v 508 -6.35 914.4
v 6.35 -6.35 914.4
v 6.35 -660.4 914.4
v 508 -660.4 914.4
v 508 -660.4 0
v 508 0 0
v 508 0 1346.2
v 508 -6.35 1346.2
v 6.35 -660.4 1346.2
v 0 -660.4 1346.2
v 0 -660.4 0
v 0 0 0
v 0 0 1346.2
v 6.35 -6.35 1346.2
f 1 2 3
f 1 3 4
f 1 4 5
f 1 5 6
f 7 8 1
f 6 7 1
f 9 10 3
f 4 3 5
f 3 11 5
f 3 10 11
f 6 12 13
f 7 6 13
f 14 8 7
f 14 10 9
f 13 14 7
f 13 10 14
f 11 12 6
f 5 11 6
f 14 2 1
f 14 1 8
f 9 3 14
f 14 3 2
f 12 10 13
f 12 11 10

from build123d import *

# Parameters (mm, degrees)
F0_W     = 508
F0_H     = 660.4
F1_DEPTH = 914.4
F2_W     = 6.35
F2_H     = 660.4
F3_DEPTH = 431.8
F4_W     = 6.35
F4_H     = 431.8
F5_DEPTH = 501.65


with BuildPart() as f1:
    # F0 (on Top) → F1 (new body)
    with BuildSketch(Plane.XY):
        with Locations((254, -330.2)):
            Rectangle(F0_W, F0_H)
    extrude(amount=F1_DEPTH)

    # F2 (on face) → F3 (join)
    with BuildSketch(Plane.XY.offset(914.4)):
        with Locations((3.175, -330.2)):
            Rectangle(F2_W, F2_H)
    extrude(amount=F3_DEPTH)

    # F4 (on face) → F5 (join)
    with BuildSketch(Plane.YZ.offset(6.35)):
        with Locations((-3.175, 1130.3)):
            Rectangle(F4_W, F4_H)
    extrude(amount=F5_DEPTH)


solid = f1.part
